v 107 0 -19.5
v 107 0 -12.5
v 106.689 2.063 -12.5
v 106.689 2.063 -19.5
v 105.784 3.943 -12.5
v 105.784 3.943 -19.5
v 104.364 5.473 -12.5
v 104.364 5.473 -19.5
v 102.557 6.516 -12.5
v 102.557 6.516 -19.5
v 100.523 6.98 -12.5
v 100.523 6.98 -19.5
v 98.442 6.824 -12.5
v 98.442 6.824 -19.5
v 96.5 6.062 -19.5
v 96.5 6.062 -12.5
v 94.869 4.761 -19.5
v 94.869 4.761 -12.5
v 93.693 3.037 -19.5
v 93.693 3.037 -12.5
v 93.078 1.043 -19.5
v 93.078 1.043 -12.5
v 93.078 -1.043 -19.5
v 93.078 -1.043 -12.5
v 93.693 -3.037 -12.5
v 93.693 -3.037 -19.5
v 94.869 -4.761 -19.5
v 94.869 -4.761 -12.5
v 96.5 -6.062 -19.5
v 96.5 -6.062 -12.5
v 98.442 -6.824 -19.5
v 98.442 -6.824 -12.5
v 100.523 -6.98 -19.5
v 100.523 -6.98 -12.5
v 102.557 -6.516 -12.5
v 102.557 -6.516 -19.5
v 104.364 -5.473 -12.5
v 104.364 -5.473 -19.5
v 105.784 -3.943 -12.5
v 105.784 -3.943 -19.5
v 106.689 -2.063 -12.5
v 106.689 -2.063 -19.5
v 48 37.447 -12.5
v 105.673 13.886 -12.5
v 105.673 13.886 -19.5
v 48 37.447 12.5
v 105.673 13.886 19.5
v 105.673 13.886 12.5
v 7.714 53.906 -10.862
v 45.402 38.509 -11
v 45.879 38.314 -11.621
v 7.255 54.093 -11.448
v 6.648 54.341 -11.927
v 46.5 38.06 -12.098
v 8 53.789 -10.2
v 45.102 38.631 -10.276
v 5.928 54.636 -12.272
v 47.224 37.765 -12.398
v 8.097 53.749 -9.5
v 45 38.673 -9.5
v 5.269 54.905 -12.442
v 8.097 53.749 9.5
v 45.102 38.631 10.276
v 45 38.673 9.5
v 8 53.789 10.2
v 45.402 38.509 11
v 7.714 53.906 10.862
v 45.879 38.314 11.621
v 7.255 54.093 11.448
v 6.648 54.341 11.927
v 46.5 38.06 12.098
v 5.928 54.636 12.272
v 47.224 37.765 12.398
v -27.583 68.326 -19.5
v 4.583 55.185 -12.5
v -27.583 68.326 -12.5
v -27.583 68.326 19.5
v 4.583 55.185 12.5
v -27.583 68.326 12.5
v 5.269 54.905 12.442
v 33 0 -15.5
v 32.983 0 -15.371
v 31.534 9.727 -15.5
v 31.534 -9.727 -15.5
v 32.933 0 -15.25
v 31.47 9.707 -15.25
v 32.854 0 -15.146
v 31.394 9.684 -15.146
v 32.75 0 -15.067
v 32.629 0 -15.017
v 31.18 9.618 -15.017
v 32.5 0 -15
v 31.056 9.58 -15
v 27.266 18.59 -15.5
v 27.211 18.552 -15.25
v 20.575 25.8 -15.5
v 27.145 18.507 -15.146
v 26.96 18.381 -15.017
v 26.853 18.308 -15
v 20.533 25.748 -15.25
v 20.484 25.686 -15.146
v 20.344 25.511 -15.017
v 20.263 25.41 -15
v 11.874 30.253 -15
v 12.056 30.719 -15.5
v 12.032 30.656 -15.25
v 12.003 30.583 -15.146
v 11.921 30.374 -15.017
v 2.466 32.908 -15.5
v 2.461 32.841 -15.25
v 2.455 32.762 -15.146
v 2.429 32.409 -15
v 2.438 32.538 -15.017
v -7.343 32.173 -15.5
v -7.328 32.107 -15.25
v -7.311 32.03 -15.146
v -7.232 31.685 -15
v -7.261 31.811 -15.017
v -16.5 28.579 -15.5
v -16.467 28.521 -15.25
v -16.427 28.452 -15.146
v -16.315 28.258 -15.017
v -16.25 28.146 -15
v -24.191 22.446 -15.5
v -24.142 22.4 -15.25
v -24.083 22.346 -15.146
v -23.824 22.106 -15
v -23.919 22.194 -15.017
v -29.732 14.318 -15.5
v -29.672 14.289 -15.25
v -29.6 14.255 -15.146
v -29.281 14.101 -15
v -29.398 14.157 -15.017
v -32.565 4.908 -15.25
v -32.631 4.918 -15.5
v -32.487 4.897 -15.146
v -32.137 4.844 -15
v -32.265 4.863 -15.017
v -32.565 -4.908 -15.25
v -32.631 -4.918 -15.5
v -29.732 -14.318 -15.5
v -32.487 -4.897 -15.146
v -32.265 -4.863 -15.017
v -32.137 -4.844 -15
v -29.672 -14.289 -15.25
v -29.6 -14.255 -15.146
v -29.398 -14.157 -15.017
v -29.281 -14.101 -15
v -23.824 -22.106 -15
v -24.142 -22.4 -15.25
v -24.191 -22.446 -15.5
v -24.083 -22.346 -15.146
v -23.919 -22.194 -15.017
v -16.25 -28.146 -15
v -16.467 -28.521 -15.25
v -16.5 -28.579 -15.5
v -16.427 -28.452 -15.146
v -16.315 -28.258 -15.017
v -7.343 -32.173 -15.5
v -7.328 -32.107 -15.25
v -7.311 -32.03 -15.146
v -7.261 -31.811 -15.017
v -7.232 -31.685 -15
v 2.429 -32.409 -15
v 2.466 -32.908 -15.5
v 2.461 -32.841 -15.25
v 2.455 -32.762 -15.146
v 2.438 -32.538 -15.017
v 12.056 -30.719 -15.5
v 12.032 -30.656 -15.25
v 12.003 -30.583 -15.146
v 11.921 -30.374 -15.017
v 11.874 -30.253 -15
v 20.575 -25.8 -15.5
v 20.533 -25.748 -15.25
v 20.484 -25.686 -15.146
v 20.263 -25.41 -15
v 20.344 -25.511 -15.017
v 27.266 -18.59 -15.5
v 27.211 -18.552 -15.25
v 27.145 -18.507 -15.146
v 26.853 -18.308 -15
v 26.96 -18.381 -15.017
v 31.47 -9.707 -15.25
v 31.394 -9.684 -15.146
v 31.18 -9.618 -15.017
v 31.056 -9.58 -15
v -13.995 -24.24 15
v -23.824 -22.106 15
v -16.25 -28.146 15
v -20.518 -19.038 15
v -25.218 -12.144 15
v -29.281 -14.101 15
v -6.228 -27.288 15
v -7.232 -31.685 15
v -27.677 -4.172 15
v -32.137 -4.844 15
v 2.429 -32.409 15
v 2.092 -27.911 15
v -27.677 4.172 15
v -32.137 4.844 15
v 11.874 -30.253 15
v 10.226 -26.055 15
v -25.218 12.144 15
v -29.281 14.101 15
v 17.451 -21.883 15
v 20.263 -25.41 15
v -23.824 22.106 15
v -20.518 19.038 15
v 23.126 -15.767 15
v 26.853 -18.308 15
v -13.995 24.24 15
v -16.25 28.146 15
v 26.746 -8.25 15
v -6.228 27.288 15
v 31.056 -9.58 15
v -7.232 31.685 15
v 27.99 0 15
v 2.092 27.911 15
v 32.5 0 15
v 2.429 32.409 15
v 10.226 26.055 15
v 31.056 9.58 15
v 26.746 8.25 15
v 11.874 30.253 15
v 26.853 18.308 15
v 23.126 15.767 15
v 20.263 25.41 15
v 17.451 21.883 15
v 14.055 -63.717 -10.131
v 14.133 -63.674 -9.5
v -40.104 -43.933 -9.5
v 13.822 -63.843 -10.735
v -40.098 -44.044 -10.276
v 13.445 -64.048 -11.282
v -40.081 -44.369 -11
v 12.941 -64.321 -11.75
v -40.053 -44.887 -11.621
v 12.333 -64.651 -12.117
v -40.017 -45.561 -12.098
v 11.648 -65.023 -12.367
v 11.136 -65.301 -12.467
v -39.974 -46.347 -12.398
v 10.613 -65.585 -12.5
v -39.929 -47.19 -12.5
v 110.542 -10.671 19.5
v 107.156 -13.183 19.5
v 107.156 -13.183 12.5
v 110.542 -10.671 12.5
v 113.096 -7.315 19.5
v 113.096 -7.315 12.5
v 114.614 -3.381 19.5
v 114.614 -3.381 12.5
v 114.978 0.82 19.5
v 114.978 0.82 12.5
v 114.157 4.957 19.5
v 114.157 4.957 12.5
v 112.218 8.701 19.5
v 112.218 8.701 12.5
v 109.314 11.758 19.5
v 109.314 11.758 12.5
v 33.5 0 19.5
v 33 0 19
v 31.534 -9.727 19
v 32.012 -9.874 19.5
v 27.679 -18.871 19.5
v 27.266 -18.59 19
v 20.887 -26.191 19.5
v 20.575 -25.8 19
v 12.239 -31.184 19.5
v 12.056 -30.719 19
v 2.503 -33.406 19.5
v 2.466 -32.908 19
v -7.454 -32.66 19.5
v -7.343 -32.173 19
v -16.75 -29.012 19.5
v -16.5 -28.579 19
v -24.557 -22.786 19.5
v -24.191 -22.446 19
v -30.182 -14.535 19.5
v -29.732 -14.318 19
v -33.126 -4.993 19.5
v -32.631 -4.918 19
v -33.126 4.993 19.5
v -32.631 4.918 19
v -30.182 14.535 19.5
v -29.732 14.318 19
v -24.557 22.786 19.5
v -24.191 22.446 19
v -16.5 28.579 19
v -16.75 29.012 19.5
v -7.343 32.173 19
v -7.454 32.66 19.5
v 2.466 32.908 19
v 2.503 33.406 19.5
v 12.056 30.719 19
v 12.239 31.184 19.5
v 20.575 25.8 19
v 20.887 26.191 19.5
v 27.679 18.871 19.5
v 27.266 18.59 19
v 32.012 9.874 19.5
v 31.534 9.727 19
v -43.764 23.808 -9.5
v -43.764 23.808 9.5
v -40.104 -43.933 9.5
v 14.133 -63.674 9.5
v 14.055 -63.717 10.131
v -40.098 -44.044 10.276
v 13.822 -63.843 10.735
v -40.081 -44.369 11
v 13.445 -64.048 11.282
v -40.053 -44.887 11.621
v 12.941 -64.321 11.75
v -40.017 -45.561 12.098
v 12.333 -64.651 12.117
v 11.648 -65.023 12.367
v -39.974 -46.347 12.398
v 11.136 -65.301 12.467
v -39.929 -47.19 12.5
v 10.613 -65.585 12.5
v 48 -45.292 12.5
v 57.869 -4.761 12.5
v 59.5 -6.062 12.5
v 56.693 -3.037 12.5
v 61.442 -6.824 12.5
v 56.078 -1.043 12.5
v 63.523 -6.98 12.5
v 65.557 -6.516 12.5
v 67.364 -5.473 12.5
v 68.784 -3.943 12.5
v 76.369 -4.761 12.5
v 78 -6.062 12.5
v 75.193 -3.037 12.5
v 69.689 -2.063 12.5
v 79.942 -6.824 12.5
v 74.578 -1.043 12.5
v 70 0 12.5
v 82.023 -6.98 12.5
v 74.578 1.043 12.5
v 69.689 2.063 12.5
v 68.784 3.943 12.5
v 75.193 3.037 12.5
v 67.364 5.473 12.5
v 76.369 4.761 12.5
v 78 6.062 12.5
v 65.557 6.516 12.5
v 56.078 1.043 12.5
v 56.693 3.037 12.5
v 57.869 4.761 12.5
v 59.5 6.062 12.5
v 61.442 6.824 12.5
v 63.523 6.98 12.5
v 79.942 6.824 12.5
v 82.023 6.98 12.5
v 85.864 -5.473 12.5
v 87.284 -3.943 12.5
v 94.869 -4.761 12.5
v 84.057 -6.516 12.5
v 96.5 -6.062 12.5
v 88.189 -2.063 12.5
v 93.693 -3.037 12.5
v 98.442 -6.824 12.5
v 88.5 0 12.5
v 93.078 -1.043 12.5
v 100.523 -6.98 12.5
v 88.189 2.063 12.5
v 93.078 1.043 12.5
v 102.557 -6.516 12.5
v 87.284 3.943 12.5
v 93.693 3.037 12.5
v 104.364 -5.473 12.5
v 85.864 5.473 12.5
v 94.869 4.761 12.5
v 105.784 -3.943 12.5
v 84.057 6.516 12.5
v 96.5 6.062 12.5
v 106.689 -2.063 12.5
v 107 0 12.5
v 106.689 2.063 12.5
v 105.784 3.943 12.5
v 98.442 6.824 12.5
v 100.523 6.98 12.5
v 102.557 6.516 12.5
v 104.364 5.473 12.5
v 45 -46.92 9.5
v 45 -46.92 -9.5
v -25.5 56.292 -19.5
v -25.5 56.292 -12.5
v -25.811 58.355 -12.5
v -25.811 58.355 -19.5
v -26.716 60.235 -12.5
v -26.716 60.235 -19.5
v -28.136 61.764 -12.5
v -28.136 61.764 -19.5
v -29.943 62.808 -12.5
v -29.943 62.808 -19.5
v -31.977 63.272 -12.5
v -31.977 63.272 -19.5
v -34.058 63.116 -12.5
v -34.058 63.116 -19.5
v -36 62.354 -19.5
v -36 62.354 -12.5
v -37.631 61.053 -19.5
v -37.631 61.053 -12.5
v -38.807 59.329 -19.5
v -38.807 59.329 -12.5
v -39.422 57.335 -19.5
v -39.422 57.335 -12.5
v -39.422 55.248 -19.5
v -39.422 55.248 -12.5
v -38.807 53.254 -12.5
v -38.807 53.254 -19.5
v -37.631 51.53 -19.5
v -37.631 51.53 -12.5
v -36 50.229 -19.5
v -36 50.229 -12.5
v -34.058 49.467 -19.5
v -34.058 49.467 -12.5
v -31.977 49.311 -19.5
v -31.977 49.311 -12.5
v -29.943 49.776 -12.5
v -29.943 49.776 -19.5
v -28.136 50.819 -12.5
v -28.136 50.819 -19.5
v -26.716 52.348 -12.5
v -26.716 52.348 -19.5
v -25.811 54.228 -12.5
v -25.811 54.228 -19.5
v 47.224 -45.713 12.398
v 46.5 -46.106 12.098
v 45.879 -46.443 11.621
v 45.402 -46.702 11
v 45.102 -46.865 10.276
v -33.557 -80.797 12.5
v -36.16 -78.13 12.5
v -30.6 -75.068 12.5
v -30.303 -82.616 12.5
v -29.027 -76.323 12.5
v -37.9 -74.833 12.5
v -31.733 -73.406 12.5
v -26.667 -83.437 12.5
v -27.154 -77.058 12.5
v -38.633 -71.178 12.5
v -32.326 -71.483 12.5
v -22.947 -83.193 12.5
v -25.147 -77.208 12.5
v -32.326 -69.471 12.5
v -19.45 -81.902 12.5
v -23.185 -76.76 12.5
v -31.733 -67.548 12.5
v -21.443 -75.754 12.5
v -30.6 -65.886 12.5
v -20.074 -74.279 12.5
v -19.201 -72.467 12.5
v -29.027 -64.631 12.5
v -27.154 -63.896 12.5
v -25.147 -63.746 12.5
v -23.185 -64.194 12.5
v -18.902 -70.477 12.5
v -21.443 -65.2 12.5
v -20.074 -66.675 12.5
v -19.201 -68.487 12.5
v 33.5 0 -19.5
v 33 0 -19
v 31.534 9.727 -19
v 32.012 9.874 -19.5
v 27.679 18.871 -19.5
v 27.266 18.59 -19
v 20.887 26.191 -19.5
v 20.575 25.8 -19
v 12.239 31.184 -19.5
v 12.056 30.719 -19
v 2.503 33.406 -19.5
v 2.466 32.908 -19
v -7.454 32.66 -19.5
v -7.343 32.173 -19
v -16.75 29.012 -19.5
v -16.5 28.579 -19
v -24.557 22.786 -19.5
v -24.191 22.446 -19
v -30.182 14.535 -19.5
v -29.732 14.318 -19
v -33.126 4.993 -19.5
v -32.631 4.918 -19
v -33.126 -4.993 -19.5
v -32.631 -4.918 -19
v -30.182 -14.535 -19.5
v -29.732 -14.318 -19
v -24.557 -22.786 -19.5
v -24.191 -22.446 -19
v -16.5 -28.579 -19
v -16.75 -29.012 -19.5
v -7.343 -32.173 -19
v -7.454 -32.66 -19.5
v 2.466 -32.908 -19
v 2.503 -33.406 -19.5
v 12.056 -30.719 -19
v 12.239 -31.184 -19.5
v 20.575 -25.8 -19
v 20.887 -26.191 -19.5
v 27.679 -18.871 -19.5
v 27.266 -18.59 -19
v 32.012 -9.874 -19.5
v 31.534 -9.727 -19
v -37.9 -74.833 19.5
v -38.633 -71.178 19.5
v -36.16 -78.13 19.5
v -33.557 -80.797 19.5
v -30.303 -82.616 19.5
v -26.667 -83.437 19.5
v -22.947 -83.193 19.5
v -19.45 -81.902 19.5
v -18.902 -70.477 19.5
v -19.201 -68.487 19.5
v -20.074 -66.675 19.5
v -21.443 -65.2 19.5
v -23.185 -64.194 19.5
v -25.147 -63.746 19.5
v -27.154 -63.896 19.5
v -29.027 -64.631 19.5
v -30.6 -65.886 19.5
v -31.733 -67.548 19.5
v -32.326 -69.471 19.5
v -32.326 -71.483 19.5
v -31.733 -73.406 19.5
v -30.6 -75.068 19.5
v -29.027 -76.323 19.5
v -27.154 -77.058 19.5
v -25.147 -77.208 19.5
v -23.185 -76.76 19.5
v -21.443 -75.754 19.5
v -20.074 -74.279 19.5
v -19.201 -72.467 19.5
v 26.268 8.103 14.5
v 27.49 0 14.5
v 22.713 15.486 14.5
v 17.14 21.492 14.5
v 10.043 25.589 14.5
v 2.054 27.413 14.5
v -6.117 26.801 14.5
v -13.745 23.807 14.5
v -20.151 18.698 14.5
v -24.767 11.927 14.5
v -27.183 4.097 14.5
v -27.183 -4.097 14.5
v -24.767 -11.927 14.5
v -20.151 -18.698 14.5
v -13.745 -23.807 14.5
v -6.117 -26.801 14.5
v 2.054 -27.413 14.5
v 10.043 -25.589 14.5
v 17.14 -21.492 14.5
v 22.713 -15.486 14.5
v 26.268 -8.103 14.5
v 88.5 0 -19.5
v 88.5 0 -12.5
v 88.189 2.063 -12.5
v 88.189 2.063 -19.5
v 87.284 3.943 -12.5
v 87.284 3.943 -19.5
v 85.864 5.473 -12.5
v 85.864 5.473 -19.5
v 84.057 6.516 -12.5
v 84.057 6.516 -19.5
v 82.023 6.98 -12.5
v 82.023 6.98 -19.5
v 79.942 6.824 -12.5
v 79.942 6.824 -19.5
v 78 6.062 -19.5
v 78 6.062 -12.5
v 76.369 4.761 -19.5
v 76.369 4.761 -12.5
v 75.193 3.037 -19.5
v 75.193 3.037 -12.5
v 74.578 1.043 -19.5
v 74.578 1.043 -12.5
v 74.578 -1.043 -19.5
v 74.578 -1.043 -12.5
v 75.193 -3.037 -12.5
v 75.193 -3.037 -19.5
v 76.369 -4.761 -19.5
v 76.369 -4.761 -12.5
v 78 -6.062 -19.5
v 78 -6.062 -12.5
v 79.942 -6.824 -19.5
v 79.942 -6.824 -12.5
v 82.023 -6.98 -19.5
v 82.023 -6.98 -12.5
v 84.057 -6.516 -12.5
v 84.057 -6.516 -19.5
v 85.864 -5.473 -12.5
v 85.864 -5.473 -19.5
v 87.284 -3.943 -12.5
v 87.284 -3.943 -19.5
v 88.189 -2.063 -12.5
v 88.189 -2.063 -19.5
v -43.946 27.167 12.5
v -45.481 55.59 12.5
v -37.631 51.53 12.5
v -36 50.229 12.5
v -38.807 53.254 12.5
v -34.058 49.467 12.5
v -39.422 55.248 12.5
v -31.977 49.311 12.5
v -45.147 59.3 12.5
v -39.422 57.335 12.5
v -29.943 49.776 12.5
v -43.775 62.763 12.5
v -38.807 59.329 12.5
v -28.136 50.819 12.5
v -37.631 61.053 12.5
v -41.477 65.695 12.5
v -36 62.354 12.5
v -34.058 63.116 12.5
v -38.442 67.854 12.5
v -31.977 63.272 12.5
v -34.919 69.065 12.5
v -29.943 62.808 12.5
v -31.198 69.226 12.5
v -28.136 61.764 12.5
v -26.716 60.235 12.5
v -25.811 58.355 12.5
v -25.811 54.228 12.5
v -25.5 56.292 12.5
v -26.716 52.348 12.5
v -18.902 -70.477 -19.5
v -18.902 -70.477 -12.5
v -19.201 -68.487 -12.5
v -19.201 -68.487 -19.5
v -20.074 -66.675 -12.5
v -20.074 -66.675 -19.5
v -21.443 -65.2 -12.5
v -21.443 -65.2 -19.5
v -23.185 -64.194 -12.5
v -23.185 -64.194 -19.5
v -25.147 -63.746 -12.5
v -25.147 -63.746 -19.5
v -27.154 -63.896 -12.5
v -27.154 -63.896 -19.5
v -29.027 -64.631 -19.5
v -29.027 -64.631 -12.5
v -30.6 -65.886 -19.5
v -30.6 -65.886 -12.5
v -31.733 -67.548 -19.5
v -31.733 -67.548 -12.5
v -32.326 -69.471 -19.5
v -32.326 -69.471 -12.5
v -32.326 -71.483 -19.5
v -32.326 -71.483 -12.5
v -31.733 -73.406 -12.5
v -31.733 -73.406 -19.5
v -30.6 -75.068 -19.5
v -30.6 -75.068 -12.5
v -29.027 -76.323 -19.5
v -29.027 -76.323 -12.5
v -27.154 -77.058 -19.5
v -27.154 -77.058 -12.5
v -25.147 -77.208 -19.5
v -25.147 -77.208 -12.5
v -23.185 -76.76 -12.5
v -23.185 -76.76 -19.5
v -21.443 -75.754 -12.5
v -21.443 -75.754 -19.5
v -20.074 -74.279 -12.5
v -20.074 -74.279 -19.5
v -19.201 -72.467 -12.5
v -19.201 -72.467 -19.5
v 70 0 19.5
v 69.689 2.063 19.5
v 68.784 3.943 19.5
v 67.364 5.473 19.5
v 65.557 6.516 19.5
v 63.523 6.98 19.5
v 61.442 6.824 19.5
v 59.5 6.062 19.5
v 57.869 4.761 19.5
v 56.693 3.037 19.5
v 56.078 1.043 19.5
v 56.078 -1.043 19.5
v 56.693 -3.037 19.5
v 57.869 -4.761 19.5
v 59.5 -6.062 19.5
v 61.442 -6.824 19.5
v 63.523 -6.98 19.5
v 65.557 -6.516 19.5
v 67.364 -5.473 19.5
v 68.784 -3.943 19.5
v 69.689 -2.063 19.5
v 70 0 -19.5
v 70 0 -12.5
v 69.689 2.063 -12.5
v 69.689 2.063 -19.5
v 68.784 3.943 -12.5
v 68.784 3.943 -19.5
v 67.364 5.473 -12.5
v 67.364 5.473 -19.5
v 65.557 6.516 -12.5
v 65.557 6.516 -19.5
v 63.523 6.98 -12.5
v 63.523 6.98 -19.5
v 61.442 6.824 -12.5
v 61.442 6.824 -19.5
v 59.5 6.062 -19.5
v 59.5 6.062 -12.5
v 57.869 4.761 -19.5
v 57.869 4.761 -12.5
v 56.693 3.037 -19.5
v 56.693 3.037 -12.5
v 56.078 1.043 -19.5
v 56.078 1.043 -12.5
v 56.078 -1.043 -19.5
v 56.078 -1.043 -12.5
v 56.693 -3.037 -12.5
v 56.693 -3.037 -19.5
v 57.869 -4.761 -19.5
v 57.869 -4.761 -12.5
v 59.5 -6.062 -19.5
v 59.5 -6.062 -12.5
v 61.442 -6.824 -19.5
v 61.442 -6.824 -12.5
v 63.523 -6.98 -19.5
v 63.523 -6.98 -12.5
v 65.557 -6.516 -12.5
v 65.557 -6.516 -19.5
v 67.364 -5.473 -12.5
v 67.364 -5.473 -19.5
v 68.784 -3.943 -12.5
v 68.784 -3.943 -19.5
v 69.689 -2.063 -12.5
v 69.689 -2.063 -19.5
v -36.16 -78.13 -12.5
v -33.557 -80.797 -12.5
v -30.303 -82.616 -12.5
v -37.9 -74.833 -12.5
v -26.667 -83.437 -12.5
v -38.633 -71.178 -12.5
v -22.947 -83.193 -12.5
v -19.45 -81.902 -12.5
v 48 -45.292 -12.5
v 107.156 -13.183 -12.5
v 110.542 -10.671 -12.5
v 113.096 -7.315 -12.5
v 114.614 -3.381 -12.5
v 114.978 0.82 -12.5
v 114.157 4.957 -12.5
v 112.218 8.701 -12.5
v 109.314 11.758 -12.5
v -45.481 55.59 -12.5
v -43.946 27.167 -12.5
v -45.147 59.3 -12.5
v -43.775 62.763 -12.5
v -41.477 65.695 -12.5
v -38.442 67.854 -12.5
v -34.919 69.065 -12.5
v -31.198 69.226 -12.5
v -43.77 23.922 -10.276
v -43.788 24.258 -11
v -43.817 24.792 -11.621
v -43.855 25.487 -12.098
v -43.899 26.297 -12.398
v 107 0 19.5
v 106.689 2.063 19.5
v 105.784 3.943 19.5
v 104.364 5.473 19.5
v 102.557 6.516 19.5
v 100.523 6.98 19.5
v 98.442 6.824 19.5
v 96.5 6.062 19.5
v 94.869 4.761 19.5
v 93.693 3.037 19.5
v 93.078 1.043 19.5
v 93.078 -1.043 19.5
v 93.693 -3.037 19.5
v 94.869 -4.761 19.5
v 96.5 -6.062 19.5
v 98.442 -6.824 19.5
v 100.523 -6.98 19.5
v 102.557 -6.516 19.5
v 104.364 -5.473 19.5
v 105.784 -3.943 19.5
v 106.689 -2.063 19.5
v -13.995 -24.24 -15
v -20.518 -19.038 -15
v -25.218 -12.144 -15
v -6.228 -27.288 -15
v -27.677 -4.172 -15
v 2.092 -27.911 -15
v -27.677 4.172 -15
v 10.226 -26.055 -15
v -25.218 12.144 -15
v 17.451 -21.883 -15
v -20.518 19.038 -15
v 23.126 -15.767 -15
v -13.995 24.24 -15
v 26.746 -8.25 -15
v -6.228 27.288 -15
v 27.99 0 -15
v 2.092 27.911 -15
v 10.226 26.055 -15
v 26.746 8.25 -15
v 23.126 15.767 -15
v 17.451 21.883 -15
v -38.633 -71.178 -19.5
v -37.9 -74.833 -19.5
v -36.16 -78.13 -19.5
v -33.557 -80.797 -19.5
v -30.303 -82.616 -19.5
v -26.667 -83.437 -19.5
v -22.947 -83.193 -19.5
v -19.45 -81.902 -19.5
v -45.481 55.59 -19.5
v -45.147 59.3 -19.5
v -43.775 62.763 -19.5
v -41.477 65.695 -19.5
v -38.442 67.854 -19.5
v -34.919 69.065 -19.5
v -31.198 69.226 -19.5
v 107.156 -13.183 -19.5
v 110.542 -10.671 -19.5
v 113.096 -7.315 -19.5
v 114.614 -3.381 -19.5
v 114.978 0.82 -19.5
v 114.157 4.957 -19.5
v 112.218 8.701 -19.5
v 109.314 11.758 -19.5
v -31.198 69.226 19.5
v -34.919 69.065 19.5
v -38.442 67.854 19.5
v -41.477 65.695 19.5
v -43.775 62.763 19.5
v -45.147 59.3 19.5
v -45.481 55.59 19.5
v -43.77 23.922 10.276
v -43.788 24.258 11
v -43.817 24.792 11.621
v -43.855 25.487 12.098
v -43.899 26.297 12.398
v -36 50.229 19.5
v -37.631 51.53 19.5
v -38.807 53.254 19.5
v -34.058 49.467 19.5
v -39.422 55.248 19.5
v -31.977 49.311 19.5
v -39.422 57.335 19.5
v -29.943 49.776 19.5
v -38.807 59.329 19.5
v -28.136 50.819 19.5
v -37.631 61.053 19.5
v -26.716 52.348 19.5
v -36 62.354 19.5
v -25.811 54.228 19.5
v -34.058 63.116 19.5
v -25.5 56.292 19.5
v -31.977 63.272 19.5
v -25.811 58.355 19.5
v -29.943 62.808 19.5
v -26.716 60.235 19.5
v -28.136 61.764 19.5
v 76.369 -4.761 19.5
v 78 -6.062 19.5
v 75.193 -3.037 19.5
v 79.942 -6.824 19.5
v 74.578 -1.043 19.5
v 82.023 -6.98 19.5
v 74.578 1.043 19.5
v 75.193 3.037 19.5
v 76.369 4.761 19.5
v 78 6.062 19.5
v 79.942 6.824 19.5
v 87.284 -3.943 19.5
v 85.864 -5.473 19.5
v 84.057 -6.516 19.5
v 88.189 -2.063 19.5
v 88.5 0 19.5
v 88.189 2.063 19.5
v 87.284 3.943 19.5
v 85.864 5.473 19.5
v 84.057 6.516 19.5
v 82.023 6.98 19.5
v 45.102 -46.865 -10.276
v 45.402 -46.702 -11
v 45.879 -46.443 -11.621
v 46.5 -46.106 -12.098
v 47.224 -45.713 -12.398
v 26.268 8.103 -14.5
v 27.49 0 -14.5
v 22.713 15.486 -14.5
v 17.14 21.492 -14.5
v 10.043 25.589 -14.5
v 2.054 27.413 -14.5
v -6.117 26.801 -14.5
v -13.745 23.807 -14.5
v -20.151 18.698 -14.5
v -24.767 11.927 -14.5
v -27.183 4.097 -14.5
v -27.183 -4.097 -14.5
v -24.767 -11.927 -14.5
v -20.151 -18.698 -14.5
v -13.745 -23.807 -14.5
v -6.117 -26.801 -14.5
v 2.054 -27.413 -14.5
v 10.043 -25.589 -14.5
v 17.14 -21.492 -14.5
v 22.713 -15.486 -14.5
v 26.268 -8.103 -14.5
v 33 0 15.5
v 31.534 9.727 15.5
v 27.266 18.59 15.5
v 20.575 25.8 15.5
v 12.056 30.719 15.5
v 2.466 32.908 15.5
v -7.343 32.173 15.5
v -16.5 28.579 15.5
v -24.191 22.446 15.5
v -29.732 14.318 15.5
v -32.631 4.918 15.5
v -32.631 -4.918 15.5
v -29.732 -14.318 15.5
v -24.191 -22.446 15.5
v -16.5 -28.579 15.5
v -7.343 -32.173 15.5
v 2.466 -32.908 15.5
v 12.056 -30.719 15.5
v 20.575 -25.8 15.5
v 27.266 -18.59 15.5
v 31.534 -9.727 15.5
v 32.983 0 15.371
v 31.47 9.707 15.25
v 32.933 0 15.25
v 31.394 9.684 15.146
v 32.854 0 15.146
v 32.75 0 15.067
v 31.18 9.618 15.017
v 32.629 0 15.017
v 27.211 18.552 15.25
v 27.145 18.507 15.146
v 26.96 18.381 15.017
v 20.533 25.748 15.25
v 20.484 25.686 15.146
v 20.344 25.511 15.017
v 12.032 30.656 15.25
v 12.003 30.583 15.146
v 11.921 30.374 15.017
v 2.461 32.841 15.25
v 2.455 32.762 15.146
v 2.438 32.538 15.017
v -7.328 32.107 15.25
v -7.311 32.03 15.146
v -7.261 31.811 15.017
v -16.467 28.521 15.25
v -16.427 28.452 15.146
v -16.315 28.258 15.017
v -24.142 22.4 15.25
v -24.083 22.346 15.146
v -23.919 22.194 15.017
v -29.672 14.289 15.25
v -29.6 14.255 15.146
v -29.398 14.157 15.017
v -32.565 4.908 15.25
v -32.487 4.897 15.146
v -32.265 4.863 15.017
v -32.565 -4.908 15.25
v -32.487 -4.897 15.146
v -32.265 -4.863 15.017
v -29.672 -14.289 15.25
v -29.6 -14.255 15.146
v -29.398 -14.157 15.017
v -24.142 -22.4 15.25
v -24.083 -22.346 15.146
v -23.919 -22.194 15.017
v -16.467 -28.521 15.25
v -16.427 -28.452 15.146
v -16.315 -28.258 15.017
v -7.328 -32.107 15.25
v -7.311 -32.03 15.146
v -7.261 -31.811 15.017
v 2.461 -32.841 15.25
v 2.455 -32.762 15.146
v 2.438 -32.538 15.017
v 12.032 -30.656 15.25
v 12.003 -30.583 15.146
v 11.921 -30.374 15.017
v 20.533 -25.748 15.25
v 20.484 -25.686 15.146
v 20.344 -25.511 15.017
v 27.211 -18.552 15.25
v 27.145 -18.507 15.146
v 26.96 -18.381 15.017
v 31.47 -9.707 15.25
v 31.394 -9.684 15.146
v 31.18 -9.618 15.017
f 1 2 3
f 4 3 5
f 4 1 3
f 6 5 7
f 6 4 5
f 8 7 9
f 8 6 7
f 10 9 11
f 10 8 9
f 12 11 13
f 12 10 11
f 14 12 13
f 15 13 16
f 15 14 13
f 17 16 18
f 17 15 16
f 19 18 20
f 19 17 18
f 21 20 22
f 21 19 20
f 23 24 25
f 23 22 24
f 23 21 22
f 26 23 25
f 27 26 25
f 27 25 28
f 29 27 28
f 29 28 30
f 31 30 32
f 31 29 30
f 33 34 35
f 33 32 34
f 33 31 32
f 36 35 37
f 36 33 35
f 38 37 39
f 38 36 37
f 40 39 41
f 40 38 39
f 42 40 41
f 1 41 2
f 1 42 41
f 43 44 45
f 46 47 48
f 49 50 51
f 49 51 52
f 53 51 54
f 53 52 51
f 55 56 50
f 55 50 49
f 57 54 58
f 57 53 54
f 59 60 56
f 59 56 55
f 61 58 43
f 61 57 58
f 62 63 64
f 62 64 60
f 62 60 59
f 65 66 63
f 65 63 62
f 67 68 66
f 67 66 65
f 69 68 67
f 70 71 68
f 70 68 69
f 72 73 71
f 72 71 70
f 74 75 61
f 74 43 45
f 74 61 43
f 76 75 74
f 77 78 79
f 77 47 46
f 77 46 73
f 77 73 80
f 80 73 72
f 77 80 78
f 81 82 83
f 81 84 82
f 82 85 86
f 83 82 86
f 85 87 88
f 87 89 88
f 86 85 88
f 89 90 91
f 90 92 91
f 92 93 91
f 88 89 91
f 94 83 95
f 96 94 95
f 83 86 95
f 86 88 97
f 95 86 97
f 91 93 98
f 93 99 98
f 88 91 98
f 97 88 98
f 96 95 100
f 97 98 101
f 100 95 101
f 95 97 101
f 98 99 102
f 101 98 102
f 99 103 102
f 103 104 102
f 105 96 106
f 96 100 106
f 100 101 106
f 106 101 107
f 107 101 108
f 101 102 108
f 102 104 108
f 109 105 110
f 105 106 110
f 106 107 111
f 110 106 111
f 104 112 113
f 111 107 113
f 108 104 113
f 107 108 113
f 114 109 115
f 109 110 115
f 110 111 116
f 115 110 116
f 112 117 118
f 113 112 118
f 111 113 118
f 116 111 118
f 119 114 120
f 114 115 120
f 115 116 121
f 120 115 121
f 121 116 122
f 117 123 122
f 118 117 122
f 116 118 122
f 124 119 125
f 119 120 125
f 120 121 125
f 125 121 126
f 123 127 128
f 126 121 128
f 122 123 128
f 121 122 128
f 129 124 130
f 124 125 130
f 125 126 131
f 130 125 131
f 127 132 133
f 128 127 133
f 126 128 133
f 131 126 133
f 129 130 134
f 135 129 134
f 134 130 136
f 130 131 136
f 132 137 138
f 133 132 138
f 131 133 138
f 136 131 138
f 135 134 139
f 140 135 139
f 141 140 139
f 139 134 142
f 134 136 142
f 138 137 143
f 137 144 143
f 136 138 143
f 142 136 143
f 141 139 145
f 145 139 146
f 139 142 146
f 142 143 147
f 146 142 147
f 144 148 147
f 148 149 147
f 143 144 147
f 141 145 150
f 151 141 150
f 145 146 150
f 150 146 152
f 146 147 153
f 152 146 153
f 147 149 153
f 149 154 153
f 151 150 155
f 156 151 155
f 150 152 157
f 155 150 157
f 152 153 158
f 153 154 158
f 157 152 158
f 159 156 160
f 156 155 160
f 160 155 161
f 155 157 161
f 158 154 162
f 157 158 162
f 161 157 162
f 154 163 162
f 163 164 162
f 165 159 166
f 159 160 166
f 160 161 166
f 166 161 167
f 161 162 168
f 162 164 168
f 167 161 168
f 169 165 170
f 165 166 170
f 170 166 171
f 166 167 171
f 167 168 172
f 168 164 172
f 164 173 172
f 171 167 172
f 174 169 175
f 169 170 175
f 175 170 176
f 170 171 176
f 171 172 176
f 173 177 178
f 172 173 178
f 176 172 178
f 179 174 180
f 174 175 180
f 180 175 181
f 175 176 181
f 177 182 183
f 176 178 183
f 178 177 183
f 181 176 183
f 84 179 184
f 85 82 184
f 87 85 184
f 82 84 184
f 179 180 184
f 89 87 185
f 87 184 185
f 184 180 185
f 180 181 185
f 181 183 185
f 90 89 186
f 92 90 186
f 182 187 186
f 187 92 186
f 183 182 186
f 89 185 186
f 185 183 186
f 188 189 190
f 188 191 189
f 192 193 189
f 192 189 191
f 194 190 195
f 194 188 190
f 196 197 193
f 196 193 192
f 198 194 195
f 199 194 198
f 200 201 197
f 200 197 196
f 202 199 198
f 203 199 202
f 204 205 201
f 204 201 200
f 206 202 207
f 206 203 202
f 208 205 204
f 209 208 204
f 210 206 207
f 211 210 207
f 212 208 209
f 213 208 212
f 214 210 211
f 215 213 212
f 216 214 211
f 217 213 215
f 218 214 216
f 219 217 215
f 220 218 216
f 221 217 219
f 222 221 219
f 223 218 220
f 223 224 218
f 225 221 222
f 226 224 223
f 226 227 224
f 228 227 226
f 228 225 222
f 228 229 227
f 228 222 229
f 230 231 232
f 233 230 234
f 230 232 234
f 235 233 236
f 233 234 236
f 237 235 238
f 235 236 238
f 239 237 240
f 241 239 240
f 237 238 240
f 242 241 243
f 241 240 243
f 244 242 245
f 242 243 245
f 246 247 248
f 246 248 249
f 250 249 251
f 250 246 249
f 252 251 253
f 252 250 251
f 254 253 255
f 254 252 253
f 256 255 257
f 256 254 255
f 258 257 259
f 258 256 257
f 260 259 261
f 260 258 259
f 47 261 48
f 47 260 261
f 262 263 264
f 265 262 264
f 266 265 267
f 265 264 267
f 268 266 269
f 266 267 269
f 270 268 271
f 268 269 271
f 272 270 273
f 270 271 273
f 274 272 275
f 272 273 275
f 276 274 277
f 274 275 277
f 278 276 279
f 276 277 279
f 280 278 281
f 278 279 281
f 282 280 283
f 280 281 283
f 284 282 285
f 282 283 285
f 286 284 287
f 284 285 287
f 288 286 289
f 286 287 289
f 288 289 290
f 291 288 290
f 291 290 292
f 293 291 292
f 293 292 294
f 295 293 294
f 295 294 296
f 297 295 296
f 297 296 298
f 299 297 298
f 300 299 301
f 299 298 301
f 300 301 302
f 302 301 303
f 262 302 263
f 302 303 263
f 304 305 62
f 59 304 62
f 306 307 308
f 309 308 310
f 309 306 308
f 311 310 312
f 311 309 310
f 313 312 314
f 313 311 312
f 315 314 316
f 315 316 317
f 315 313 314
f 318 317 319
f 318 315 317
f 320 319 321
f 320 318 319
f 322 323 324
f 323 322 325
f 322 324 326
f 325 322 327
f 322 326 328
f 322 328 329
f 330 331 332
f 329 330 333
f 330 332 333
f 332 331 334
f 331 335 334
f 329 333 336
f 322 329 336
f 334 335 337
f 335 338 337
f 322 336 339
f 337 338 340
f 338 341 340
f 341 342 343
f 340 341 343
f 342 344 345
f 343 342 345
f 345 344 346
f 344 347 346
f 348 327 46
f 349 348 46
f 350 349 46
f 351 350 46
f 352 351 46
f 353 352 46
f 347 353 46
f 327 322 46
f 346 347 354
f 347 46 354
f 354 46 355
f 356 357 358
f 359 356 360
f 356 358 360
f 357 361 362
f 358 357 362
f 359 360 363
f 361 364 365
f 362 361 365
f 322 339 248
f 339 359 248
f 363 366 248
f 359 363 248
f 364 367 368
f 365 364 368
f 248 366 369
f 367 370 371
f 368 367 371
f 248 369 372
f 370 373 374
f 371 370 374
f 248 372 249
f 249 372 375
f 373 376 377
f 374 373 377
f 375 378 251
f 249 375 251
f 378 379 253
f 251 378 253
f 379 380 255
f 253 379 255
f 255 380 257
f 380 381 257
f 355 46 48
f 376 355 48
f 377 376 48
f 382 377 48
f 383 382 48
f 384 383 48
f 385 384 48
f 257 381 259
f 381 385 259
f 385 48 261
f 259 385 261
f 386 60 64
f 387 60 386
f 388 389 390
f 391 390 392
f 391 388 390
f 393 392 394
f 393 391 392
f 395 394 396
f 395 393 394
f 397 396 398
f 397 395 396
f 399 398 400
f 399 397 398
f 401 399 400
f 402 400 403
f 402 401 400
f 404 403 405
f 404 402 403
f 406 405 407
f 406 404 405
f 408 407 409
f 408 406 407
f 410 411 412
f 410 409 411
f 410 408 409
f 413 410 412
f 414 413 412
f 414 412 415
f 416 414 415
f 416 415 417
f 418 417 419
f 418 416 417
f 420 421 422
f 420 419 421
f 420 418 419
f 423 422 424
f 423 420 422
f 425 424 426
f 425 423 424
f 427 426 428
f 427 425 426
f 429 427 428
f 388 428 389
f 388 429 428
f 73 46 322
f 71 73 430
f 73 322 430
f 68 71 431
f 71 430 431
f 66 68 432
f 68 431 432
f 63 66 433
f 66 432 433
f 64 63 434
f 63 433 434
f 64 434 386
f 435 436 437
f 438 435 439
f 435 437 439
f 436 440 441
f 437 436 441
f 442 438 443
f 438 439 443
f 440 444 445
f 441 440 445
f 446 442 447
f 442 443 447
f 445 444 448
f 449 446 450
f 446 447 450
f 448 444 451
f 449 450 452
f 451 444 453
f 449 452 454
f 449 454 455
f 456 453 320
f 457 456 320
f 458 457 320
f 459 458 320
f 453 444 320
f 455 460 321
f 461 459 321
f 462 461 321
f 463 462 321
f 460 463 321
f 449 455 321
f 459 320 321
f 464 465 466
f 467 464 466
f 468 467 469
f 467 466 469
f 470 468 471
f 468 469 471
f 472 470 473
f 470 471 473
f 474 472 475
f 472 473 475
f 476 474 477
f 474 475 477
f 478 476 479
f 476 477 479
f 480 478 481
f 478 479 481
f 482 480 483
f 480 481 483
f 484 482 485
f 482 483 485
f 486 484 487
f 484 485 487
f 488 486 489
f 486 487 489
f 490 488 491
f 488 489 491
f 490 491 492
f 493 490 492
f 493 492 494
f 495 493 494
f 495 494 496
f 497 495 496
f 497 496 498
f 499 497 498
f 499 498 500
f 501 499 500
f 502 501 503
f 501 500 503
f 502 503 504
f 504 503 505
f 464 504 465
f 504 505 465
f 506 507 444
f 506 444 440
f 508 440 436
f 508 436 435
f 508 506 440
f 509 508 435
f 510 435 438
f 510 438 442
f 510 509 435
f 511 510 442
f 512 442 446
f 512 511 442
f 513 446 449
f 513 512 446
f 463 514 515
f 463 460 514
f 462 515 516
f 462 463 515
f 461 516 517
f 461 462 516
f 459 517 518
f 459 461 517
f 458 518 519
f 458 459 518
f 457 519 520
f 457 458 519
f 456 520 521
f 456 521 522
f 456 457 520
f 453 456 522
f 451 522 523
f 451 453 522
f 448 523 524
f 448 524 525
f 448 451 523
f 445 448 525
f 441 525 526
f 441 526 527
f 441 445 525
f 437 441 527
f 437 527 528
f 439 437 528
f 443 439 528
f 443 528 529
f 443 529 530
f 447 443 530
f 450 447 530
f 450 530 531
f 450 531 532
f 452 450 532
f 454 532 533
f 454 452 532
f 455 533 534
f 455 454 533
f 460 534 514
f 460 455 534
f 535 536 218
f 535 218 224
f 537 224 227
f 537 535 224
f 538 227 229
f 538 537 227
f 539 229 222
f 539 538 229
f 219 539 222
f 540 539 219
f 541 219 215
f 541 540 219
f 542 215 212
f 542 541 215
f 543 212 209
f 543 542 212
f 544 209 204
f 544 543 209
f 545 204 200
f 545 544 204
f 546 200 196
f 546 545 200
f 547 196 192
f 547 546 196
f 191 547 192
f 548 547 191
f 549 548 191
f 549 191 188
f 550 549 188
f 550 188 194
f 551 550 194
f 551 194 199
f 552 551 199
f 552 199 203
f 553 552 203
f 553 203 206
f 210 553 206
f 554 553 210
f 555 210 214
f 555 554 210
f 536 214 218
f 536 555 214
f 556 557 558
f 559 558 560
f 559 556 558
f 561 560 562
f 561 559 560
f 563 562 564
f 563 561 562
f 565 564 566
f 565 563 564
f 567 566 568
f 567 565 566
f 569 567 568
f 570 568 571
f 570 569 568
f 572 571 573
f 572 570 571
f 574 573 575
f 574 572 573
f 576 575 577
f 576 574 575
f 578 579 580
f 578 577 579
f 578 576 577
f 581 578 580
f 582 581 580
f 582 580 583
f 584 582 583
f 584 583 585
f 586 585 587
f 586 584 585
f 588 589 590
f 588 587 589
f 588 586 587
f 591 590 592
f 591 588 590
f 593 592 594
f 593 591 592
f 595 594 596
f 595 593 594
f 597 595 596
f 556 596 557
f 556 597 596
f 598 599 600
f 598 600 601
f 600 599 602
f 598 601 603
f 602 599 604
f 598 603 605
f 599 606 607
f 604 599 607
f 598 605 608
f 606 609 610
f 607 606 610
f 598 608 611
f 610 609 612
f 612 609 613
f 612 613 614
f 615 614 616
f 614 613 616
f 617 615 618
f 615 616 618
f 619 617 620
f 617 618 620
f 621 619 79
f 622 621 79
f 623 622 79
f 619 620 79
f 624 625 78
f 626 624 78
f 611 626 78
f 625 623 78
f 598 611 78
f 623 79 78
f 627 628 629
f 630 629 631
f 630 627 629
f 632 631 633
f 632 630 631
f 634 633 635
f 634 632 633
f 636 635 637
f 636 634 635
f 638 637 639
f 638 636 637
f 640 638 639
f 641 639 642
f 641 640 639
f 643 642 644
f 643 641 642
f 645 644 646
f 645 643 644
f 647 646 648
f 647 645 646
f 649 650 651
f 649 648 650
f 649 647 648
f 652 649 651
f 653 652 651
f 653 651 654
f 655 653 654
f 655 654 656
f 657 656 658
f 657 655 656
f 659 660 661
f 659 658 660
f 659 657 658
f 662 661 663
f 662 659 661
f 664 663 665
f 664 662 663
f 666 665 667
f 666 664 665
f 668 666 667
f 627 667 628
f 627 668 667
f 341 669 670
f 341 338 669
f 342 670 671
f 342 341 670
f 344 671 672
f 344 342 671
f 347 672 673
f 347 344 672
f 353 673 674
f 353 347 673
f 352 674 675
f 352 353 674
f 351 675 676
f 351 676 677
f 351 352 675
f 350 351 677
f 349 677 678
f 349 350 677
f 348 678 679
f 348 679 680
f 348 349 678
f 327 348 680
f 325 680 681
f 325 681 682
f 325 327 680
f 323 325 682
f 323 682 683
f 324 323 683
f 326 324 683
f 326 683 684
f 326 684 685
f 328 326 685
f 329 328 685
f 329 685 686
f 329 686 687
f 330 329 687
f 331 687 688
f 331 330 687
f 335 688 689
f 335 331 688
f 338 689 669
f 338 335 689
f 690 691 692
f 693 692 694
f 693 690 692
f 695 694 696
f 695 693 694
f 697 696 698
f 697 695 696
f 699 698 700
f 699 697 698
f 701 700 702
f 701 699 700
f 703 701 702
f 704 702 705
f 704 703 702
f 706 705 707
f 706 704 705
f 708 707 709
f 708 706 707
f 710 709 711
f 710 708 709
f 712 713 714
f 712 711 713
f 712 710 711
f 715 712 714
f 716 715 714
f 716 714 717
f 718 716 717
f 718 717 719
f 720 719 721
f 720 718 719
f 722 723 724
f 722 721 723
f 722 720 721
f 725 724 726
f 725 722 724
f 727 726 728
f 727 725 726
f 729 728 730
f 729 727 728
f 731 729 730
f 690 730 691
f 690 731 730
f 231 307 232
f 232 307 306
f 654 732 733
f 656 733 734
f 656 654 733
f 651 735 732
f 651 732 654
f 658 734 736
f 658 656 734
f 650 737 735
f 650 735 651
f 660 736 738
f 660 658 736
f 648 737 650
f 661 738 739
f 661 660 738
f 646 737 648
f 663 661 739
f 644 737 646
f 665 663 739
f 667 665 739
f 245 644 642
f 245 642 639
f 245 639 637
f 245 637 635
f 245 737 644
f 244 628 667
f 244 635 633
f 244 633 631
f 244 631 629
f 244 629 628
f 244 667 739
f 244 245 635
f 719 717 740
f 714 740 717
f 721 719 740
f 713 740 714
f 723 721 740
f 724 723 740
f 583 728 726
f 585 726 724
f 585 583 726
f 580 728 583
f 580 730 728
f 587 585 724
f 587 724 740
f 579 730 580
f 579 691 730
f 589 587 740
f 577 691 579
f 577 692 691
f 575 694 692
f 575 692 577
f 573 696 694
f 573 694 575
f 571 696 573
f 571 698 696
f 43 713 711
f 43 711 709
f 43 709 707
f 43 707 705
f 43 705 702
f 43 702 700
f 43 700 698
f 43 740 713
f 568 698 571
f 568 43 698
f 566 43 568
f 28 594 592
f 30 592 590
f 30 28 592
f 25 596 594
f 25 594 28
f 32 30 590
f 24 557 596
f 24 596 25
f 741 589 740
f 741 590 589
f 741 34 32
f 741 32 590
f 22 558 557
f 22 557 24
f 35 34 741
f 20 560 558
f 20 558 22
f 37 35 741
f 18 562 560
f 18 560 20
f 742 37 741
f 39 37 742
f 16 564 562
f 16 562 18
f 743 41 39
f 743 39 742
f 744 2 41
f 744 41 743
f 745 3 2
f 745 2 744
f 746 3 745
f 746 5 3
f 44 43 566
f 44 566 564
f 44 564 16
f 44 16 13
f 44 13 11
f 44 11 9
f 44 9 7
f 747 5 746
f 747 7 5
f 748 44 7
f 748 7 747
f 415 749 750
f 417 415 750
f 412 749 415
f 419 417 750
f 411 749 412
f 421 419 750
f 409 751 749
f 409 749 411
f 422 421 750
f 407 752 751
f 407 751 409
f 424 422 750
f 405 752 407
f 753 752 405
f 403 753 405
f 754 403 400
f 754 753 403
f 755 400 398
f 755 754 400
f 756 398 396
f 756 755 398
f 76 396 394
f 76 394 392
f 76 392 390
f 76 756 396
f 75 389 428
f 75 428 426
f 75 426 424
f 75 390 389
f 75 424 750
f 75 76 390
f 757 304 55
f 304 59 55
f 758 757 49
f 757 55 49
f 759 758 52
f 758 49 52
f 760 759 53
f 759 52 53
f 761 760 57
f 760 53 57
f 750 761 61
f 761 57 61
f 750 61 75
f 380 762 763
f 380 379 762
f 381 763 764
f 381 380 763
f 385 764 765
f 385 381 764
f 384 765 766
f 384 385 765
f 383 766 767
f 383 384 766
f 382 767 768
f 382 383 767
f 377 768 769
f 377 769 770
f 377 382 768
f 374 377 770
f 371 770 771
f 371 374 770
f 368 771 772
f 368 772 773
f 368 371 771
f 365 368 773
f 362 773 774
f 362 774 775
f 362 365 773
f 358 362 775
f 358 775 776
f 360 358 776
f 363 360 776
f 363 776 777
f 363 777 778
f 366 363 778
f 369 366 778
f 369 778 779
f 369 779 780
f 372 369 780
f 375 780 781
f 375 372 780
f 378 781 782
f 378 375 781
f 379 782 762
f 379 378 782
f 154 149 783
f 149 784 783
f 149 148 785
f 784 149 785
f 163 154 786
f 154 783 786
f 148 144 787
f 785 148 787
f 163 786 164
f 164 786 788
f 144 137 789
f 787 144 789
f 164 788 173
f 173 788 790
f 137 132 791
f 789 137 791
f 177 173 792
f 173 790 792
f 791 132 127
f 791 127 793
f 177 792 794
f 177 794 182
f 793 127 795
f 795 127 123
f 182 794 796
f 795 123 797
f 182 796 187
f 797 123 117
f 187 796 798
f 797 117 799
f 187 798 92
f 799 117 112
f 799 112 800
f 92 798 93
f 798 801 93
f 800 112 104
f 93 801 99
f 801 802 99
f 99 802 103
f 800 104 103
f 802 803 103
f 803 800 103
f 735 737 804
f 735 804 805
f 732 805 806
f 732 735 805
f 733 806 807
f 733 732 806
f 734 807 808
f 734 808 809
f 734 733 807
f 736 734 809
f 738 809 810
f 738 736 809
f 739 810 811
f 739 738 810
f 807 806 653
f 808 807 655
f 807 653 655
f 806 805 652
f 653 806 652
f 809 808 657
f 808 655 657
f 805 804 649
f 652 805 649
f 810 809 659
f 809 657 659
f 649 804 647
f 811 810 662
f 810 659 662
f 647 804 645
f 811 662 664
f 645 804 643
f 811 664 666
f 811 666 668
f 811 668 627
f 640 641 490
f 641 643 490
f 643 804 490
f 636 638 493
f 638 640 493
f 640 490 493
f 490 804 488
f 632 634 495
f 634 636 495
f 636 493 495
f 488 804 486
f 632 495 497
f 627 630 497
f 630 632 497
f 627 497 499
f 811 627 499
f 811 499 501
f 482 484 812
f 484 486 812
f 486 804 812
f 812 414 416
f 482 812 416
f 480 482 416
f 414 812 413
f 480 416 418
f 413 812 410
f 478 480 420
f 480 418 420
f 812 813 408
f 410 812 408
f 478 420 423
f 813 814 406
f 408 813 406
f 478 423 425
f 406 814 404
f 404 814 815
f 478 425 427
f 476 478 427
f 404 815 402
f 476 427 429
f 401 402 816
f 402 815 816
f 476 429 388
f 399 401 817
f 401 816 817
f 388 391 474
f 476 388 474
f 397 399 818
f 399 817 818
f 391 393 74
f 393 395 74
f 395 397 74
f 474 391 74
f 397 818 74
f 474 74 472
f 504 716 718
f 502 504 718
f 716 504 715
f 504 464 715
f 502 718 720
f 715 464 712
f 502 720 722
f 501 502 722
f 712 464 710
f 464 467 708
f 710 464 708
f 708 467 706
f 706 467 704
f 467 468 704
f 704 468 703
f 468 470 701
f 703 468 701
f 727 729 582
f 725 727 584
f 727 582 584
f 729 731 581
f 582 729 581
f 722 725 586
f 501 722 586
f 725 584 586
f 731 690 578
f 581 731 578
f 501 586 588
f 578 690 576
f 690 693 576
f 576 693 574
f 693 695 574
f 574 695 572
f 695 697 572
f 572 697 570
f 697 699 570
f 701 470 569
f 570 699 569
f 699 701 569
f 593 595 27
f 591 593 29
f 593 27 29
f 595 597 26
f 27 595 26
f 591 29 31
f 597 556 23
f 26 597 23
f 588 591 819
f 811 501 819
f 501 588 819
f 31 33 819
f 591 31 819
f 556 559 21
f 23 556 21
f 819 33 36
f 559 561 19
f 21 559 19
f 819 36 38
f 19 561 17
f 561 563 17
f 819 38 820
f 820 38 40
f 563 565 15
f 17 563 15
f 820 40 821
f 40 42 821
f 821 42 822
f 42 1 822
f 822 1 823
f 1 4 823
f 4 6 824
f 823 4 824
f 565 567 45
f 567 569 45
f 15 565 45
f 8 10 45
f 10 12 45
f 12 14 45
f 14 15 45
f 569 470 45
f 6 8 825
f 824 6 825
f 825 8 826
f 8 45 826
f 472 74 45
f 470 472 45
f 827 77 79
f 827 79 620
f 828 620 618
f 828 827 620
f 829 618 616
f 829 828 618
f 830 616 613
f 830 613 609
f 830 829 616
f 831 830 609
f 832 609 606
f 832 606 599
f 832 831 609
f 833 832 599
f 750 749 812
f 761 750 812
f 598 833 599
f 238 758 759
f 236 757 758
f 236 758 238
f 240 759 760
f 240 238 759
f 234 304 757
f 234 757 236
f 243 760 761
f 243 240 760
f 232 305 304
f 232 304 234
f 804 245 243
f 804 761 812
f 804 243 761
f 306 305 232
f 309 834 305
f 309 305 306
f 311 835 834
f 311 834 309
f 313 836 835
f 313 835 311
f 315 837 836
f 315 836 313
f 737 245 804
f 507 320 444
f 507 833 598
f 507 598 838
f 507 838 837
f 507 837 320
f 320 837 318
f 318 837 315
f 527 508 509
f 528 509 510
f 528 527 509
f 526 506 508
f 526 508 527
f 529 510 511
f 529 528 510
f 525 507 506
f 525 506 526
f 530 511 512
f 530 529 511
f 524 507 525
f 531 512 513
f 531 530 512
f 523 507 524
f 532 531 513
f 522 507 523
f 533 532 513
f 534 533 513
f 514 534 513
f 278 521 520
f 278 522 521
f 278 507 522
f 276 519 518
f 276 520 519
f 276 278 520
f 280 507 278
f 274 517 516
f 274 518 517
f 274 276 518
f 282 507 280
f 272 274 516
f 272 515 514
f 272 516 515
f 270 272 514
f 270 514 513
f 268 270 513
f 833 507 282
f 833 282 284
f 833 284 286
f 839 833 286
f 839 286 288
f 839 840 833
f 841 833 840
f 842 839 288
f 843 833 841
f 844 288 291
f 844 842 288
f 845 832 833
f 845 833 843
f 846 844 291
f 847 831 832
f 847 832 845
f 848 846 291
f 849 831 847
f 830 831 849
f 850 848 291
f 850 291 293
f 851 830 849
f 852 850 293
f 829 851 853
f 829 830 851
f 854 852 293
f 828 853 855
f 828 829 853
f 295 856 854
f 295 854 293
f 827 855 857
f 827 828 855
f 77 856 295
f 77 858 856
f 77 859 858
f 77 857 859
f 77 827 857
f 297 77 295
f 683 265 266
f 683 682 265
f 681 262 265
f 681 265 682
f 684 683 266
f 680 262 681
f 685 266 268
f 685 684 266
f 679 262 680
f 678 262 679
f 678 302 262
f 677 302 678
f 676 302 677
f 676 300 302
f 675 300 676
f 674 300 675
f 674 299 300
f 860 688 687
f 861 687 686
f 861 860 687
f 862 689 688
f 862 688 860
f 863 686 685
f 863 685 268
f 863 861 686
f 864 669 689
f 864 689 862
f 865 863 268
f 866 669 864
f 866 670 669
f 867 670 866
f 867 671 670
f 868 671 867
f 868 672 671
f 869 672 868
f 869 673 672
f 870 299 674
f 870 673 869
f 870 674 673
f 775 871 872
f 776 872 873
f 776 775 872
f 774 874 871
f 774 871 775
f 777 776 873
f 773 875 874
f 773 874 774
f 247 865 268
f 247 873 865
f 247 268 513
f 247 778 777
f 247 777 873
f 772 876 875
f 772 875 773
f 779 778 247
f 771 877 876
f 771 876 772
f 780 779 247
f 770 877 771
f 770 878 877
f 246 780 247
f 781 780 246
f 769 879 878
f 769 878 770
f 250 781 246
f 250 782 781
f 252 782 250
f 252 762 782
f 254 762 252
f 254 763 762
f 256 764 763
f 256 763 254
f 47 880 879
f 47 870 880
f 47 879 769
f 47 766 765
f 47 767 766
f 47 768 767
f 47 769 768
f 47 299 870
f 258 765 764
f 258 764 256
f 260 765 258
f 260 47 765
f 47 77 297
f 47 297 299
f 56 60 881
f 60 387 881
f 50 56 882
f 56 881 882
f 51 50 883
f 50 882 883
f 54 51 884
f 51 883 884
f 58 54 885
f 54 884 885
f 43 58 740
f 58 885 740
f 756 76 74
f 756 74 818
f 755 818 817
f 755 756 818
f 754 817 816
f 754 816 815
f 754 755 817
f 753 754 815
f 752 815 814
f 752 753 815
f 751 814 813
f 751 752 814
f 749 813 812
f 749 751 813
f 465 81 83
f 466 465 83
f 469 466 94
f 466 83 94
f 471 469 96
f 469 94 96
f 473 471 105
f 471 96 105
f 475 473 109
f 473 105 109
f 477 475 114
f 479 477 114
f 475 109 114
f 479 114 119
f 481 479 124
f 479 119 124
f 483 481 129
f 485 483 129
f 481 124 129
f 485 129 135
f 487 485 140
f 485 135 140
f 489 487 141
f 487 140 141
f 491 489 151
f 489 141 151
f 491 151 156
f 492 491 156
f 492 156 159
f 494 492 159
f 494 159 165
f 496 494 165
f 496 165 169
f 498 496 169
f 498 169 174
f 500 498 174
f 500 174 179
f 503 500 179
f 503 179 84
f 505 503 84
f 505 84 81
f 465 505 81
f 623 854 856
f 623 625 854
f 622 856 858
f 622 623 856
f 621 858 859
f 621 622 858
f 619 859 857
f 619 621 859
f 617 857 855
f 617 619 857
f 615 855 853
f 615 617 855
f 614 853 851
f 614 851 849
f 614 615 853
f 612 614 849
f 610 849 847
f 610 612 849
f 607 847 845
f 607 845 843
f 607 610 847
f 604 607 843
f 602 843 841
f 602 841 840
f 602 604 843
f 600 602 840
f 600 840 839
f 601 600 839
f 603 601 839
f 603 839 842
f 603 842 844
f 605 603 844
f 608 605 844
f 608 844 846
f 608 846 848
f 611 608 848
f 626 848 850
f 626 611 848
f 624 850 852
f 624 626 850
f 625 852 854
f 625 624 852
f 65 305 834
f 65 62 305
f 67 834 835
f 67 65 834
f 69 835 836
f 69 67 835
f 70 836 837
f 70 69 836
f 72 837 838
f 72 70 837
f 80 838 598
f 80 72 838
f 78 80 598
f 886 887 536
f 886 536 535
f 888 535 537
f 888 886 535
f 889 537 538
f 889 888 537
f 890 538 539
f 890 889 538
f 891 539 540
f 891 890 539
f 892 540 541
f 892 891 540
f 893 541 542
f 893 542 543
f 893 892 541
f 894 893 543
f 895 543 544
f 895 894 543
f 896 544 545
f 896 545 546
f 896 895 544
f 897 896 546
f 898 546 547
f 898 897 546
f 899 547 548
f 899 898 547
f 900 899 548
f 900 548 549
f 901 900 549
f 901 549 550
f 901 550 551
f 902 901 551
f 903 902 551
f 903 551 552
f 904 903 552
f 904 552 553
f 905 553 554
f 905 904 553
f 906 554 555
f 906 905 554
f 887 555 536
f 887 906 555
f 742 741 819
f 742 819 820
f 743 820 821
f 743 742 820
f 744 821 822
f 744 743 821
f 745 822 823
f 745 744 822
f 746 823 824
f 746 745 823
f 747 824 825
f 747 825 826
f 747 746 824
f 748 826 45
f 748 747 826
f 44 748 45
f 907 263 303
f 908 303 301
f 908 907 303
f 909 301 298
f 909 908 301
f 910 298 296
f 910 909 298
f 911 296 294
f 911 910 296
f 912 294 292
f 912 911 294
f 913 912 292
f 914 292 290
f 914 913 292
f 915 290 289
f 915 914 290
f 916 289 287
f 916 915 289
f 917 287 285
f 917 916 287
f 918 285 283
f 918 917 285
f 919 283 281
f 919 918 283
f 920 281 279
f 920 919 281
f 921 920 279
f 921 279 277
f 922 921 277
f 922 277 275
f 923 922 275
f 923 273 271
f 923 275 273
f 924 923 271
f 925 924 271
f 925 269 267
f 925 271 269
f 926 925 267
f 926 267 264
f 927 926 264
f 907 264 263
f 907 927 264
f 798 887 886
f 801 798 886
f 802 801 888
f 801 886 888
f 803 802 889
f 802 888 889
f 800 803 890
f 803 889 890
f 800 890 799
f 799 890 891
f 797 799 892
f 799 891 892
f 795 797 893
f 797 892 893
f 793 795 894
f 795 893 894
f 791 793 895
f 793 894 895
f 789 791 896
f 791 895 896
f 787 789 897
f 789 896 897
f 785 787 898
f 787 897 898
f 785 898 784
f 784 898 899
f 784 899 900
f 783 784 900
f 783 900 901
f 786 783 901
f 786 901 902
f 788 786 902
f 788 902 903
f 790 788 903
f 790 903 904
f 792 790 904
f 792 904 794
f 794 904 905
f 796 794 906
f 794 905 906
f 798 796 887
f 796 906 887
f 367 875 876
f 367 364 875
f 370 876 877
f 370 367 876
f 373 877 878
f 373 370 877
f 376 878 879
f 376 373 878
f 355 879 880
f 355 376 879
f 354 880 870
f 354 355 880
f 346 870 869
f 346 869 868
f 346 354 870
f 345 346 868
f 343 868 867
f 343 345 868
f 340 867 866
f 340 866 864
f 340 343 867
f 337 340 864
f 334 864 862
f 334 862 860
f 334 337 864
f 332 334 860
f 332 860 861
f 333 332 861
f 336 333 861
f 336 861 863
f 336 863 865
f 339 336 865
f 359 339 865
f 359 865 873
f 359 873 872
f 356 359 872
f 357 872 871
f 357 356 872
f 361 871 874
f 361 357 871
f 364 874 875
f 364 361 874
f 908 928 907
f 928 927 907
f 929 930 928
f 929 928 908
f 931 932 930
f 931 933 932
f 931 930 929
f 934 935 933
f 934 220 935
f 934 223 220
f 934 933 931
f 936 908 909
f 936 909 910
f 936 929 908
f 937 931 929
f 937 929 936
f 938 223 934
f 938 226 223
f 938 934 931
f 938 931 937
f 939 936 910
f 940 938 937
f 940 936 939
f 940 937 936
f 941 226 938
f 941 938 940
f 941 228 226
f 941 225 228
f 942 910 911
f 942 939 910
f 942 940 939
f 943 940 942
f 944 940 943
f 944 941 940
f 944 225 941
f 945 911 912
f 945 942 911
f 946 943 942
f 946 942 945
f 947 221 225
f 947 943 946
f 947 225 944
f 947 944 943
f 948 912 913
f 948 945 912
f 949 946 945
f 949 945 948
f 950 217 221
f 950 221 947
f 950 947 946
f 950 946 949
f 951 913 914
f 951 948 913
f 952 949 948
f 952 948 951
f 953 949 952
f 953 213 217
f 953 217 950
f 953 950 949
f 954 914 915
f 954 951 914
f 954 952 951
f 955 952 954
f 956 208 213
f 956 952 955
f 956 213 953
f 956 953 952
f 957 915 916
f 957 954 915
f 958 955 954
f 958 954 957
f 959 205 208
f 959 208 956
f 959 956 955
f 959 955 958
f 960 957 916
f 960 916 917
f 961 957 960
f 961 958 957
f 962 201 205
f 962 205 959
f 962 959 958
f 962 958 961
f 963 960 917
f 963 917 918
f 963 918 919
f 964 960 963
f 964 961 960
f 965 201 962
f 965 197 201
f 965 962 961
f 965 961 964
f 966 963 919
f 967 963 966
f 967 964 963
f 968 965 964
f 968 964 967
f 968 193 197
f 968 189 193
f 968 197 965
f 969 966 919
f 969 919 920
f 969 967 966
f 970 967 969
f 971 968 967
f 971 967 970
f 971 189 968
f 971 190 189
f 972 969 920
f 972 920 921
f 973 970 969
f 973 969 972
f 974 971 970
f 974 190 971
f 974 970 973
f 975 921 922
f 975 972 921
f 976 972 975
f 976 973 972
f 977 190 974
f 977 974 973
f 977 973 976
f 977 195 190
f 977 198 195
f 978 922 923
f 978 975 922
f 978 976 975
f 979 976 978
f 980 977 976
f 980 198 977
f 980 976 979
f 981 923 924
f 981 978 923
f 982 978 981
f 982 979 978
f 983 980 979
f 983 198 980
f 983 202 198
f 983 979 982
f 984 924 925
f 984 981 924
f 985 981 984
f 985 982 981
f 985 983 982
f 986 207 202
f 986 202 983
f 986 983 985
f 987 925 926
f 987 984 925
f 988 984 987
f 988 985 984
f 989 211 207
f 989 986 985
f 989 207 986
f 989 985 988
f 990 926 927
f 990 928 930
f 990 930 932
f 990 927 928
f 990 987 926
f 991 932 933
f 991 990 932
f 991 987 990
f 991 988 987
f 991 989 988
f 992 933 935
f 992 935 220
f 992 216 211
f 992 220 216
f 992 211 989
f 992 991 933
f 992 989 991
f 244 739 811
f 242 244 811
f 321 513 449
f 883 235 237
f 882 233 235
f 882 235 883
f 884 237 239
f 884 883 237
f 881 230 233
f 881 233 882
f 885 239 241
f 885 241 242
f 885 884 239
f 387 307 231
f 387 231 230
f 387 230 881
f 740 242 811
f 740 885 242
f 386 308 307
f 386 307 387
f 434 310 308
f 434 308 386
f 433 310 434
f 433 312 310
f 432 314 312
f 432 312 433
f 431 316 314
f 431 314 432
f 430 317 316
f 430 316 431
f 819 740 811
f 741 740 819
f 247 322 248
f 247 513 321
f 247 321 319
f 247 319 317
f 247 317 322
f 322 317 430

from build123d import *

# Parameters (mm, degrees)
F0_R          = 6.75
F0_R_2        = 33
F0_R_3        = 7
F0_R_4        = 27.48975
F1_DEPTH      = 19.5
F1_DEPTH_BACK = 19.5
F2_START      = 15
F2_DEPTH      = 10
F6_DEPTH      = 12.5
F6_DEPTH_BACK = 12.5
F7_R          = 3
F8_SIZE       = 0.5
F9_R          = 0.5


# Not quite as in the source:
# - a feature names something its author has since deleted; it is built from what else it names


with BuildPart() as f1:
    # F0 (on Top) → F1 (new body, two sides)
    with BuildSketch(Plane.XY) as f1_sk:
        with BuildLine():
            Line((-19.4499833155, -81.9024031138), (107.1556085776, -13.1832191017))
            ThreePointArc((107.1556085776, -13.1832191017), (114.9775485096, 0.8203905436), (105.6729061946, 13.8858969933))
            Line((105.6729061946, 13.8858969933), (-27.583481298, 68.3260953068))
            ThreePointArc((-27.583481298, 68.3260953068), (-40.0371705269, 66.8836794016), (-45.4810708907, 55.5903677578))
            Line((-45.4810708907, 55.5903677578), (-38.6325816401, -71.1782300471))
            ThreePointArc((-38.6325816401, -71.1782300471), (-31.9952103295, -81.8240816881), (-19.4499833155, -81.9024031138))
        make_face()
        with Locations((-25.6515107494, -70.4769465589)):
            Circle(F0_R, mode=Mode.SUBTRACT)
        Circle(F0_R_2, mode=Mode.SUBTRACT)
        with Locations((-32.5, 56.291651246)):
            Circle(F0_R_3, mode=Mode.SUBTRACT)
        with Locations((63, 0)):
            Circle(F0_R_3, mode=Mode.SUBTRACT)
        with Locations((81.5, 0)):
            Circle(F0_R_3, mode=Mode.SUBTRACT)
        with Locations((100, 0)):
            Circle(F0_R_3, mode=Mode.SUBTRACT)
        Circle(F0_R_2)
        Circle(F0_R_4, mode=Mode.SUBTRACT)
    extrude(amount=F1_DEPTH)
    extrude(f1_sk.sketch, amount=-F1_DEPTH_BACK)


with BuildPart() as f2:
    # F0 (on Top) → F2 (new body)
    with BuildSketch(Plane.XY.offset(F2_START)):
        Circle(F0_R_2)
        Circle(F0_R_4, mode=Mode.SUBTRACT)
    extrude(amount=F2_DEPTH)


with BuildPart() as f3_1:
    # F3: instance of F2
    add(f2.part.mirror(Plane.XY))


with BuildPart() as f1_1:
    add(f1.part)

    # F4: cut F2, F3_1
    add(f2.part, mode=Mode.SUBTRACT)
    add(f3_1.part, mode=Mode.SUBTRACT)

    # F5 (on Top) → F6 (cut, two sides)
    with BuildSketch(Plane.XY) as f6_sk:
        Polygon((-66.9979324298, -150.1462552281), (233.1545138204, 12.7709657028), (-82.7719960075, 141.8387137572), (-75.4085285246, 5.5376386383), (45, 75.0555349947), (45, -74.9084380282), (-73.3904532444, -31.8178370259), align=None)
    extrude(amount=-F6_DEPTH, mode=Mode.SUBTRACT)
    extrude(f6_sk.sketch, amount=F6_DEPTH_BACK, mode=Mode.SUBTRACT)

    # F7
    f7_edges = [f1_1.edges().sort_by_distance(p)[0] for p in [
        (45, -4.12355, -12.5),
        (-17.833672, 38.778497, -12.5),
        (-17.833672, 38.778497, 12.5),
        (45, -4.12355, 12.5),
        (-12.985509, -53.803439, 12.5),
        (-12.985509, -53.803439, -12.5),
    ]]
    fillet(f7_edges, radius=F7_R)

    # F8
    f8_edges = [f1_1.edges().sort_by_distance(p)[0] for p in [
        (-27.48975, 0, 15),
        (-27.48975, 0, -15),
        (-33, 0, 19.5),
        (-33, 0, -19.5),
    ]]
    chamfer(f8_edges, length=F8_SIZE)

    # F9
    f9_edges = [f1_1.edges().sort_by_distance(p)[0] for p in [
        (-33, 0, -15),
        (-33, 0, 15),
    ]]
    fillet(f9_edges, radius=F9_R)


solid = f1_1.part
